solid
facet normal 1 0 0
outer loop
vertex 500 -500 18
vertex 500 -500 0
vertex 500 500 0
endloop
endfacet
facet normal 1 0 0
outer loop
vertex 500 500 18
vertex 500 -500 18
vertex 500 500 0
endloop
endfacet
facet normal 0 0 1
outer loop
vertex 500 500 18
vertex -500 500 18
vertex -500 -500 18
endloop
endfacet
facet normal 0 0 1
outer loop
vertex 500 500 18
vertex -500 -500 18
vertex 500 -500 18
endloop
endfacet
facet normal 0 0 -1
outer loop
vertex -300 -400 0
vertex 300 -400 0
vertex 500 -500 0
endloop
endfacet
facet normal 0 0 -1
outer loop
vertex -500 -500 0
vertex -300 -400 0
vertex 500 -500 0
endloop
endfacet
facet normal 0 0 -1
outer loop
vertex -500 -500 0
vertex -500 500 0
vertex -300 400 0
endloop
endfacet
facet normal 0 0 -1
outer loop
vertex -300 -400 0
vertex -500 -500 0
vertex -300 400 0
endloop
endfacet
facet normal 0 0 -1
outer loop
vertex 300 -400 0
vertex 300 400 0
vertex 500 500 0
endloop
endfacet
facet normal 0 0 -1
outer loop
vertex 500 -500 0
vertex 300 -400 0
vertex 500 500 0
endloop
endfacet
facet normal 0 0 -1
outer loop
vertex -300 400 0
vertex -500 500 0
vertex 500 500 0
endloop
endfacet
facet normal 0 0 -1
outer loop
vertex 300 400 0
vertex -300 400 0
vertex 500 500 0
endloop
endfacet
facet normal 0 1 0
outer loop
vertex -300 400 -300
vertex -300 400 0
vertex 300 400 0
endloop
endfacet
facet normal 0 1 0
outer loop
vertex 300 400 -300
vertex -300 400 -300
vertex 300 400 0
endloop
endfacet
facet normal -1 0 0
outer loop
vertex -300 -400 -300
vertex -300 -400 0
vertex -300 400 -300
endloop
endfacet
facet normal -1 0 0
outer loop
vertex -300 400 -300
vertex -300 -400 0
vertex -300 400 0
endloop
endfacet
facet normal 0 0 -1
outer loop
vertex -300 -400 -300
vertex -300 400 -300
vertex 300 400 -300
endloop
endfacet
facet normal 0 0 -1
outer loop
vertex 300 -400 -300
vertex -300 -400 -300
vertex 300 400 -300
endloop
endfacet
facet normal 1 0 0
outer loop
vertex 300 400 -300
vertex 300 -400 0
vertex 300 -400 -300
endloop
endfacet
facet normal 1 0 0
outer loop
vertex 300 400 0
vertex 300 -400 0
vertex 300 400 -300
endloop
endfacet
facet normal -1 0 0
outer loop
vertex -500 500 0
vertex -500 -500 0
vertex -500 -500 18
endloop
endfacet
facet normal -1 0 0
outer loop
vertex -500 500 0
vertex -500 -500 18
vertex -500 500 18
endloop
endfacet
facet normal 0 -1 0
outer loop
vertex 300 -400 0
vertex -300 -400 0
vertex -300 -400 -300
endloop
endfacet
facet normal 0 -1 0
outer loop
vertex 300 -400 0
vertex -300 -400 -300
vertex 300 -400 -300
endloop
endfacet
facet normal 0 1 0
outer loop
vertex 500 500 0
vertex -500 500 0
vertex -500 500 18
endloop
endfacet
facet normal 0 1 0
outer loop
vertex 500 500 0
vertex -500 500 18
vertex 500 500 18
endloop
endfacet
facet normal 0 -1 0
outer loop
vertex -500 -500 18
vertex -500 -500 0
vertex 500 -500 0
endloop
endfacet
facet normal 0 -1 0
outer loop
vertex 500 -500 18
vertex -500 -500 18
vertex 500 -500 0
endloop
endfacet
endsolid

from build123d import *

# Parameters (mm, degrees)
F2_W     = 1000
F2_H     = 1000
F2_W_2   = 600
F2_H_2   = 800
F3_DEPTH = 18
F4_DEPTH = 300


with BuildPart() as f3:
    # F2 (on Top) → F3 (new body)
    with BuildSketch(Plane.XY):
        Rectangle(F2_W, F2_H)
        Rectangle(F2_W_2, F2_H_2, mode=Mode.SUBTRACT)
        Rectangle(F2_W_2, F2_H_2)
    extrude(amount=F3_DEPTH)

    # F2 (on Top) → F4 (join)
    with BuildSketch(Plane.XY):
        Rectangle(F2_W_2, F2_H_2)
    extrude(amount=-F4_DEPTH)


solid = f3.part
